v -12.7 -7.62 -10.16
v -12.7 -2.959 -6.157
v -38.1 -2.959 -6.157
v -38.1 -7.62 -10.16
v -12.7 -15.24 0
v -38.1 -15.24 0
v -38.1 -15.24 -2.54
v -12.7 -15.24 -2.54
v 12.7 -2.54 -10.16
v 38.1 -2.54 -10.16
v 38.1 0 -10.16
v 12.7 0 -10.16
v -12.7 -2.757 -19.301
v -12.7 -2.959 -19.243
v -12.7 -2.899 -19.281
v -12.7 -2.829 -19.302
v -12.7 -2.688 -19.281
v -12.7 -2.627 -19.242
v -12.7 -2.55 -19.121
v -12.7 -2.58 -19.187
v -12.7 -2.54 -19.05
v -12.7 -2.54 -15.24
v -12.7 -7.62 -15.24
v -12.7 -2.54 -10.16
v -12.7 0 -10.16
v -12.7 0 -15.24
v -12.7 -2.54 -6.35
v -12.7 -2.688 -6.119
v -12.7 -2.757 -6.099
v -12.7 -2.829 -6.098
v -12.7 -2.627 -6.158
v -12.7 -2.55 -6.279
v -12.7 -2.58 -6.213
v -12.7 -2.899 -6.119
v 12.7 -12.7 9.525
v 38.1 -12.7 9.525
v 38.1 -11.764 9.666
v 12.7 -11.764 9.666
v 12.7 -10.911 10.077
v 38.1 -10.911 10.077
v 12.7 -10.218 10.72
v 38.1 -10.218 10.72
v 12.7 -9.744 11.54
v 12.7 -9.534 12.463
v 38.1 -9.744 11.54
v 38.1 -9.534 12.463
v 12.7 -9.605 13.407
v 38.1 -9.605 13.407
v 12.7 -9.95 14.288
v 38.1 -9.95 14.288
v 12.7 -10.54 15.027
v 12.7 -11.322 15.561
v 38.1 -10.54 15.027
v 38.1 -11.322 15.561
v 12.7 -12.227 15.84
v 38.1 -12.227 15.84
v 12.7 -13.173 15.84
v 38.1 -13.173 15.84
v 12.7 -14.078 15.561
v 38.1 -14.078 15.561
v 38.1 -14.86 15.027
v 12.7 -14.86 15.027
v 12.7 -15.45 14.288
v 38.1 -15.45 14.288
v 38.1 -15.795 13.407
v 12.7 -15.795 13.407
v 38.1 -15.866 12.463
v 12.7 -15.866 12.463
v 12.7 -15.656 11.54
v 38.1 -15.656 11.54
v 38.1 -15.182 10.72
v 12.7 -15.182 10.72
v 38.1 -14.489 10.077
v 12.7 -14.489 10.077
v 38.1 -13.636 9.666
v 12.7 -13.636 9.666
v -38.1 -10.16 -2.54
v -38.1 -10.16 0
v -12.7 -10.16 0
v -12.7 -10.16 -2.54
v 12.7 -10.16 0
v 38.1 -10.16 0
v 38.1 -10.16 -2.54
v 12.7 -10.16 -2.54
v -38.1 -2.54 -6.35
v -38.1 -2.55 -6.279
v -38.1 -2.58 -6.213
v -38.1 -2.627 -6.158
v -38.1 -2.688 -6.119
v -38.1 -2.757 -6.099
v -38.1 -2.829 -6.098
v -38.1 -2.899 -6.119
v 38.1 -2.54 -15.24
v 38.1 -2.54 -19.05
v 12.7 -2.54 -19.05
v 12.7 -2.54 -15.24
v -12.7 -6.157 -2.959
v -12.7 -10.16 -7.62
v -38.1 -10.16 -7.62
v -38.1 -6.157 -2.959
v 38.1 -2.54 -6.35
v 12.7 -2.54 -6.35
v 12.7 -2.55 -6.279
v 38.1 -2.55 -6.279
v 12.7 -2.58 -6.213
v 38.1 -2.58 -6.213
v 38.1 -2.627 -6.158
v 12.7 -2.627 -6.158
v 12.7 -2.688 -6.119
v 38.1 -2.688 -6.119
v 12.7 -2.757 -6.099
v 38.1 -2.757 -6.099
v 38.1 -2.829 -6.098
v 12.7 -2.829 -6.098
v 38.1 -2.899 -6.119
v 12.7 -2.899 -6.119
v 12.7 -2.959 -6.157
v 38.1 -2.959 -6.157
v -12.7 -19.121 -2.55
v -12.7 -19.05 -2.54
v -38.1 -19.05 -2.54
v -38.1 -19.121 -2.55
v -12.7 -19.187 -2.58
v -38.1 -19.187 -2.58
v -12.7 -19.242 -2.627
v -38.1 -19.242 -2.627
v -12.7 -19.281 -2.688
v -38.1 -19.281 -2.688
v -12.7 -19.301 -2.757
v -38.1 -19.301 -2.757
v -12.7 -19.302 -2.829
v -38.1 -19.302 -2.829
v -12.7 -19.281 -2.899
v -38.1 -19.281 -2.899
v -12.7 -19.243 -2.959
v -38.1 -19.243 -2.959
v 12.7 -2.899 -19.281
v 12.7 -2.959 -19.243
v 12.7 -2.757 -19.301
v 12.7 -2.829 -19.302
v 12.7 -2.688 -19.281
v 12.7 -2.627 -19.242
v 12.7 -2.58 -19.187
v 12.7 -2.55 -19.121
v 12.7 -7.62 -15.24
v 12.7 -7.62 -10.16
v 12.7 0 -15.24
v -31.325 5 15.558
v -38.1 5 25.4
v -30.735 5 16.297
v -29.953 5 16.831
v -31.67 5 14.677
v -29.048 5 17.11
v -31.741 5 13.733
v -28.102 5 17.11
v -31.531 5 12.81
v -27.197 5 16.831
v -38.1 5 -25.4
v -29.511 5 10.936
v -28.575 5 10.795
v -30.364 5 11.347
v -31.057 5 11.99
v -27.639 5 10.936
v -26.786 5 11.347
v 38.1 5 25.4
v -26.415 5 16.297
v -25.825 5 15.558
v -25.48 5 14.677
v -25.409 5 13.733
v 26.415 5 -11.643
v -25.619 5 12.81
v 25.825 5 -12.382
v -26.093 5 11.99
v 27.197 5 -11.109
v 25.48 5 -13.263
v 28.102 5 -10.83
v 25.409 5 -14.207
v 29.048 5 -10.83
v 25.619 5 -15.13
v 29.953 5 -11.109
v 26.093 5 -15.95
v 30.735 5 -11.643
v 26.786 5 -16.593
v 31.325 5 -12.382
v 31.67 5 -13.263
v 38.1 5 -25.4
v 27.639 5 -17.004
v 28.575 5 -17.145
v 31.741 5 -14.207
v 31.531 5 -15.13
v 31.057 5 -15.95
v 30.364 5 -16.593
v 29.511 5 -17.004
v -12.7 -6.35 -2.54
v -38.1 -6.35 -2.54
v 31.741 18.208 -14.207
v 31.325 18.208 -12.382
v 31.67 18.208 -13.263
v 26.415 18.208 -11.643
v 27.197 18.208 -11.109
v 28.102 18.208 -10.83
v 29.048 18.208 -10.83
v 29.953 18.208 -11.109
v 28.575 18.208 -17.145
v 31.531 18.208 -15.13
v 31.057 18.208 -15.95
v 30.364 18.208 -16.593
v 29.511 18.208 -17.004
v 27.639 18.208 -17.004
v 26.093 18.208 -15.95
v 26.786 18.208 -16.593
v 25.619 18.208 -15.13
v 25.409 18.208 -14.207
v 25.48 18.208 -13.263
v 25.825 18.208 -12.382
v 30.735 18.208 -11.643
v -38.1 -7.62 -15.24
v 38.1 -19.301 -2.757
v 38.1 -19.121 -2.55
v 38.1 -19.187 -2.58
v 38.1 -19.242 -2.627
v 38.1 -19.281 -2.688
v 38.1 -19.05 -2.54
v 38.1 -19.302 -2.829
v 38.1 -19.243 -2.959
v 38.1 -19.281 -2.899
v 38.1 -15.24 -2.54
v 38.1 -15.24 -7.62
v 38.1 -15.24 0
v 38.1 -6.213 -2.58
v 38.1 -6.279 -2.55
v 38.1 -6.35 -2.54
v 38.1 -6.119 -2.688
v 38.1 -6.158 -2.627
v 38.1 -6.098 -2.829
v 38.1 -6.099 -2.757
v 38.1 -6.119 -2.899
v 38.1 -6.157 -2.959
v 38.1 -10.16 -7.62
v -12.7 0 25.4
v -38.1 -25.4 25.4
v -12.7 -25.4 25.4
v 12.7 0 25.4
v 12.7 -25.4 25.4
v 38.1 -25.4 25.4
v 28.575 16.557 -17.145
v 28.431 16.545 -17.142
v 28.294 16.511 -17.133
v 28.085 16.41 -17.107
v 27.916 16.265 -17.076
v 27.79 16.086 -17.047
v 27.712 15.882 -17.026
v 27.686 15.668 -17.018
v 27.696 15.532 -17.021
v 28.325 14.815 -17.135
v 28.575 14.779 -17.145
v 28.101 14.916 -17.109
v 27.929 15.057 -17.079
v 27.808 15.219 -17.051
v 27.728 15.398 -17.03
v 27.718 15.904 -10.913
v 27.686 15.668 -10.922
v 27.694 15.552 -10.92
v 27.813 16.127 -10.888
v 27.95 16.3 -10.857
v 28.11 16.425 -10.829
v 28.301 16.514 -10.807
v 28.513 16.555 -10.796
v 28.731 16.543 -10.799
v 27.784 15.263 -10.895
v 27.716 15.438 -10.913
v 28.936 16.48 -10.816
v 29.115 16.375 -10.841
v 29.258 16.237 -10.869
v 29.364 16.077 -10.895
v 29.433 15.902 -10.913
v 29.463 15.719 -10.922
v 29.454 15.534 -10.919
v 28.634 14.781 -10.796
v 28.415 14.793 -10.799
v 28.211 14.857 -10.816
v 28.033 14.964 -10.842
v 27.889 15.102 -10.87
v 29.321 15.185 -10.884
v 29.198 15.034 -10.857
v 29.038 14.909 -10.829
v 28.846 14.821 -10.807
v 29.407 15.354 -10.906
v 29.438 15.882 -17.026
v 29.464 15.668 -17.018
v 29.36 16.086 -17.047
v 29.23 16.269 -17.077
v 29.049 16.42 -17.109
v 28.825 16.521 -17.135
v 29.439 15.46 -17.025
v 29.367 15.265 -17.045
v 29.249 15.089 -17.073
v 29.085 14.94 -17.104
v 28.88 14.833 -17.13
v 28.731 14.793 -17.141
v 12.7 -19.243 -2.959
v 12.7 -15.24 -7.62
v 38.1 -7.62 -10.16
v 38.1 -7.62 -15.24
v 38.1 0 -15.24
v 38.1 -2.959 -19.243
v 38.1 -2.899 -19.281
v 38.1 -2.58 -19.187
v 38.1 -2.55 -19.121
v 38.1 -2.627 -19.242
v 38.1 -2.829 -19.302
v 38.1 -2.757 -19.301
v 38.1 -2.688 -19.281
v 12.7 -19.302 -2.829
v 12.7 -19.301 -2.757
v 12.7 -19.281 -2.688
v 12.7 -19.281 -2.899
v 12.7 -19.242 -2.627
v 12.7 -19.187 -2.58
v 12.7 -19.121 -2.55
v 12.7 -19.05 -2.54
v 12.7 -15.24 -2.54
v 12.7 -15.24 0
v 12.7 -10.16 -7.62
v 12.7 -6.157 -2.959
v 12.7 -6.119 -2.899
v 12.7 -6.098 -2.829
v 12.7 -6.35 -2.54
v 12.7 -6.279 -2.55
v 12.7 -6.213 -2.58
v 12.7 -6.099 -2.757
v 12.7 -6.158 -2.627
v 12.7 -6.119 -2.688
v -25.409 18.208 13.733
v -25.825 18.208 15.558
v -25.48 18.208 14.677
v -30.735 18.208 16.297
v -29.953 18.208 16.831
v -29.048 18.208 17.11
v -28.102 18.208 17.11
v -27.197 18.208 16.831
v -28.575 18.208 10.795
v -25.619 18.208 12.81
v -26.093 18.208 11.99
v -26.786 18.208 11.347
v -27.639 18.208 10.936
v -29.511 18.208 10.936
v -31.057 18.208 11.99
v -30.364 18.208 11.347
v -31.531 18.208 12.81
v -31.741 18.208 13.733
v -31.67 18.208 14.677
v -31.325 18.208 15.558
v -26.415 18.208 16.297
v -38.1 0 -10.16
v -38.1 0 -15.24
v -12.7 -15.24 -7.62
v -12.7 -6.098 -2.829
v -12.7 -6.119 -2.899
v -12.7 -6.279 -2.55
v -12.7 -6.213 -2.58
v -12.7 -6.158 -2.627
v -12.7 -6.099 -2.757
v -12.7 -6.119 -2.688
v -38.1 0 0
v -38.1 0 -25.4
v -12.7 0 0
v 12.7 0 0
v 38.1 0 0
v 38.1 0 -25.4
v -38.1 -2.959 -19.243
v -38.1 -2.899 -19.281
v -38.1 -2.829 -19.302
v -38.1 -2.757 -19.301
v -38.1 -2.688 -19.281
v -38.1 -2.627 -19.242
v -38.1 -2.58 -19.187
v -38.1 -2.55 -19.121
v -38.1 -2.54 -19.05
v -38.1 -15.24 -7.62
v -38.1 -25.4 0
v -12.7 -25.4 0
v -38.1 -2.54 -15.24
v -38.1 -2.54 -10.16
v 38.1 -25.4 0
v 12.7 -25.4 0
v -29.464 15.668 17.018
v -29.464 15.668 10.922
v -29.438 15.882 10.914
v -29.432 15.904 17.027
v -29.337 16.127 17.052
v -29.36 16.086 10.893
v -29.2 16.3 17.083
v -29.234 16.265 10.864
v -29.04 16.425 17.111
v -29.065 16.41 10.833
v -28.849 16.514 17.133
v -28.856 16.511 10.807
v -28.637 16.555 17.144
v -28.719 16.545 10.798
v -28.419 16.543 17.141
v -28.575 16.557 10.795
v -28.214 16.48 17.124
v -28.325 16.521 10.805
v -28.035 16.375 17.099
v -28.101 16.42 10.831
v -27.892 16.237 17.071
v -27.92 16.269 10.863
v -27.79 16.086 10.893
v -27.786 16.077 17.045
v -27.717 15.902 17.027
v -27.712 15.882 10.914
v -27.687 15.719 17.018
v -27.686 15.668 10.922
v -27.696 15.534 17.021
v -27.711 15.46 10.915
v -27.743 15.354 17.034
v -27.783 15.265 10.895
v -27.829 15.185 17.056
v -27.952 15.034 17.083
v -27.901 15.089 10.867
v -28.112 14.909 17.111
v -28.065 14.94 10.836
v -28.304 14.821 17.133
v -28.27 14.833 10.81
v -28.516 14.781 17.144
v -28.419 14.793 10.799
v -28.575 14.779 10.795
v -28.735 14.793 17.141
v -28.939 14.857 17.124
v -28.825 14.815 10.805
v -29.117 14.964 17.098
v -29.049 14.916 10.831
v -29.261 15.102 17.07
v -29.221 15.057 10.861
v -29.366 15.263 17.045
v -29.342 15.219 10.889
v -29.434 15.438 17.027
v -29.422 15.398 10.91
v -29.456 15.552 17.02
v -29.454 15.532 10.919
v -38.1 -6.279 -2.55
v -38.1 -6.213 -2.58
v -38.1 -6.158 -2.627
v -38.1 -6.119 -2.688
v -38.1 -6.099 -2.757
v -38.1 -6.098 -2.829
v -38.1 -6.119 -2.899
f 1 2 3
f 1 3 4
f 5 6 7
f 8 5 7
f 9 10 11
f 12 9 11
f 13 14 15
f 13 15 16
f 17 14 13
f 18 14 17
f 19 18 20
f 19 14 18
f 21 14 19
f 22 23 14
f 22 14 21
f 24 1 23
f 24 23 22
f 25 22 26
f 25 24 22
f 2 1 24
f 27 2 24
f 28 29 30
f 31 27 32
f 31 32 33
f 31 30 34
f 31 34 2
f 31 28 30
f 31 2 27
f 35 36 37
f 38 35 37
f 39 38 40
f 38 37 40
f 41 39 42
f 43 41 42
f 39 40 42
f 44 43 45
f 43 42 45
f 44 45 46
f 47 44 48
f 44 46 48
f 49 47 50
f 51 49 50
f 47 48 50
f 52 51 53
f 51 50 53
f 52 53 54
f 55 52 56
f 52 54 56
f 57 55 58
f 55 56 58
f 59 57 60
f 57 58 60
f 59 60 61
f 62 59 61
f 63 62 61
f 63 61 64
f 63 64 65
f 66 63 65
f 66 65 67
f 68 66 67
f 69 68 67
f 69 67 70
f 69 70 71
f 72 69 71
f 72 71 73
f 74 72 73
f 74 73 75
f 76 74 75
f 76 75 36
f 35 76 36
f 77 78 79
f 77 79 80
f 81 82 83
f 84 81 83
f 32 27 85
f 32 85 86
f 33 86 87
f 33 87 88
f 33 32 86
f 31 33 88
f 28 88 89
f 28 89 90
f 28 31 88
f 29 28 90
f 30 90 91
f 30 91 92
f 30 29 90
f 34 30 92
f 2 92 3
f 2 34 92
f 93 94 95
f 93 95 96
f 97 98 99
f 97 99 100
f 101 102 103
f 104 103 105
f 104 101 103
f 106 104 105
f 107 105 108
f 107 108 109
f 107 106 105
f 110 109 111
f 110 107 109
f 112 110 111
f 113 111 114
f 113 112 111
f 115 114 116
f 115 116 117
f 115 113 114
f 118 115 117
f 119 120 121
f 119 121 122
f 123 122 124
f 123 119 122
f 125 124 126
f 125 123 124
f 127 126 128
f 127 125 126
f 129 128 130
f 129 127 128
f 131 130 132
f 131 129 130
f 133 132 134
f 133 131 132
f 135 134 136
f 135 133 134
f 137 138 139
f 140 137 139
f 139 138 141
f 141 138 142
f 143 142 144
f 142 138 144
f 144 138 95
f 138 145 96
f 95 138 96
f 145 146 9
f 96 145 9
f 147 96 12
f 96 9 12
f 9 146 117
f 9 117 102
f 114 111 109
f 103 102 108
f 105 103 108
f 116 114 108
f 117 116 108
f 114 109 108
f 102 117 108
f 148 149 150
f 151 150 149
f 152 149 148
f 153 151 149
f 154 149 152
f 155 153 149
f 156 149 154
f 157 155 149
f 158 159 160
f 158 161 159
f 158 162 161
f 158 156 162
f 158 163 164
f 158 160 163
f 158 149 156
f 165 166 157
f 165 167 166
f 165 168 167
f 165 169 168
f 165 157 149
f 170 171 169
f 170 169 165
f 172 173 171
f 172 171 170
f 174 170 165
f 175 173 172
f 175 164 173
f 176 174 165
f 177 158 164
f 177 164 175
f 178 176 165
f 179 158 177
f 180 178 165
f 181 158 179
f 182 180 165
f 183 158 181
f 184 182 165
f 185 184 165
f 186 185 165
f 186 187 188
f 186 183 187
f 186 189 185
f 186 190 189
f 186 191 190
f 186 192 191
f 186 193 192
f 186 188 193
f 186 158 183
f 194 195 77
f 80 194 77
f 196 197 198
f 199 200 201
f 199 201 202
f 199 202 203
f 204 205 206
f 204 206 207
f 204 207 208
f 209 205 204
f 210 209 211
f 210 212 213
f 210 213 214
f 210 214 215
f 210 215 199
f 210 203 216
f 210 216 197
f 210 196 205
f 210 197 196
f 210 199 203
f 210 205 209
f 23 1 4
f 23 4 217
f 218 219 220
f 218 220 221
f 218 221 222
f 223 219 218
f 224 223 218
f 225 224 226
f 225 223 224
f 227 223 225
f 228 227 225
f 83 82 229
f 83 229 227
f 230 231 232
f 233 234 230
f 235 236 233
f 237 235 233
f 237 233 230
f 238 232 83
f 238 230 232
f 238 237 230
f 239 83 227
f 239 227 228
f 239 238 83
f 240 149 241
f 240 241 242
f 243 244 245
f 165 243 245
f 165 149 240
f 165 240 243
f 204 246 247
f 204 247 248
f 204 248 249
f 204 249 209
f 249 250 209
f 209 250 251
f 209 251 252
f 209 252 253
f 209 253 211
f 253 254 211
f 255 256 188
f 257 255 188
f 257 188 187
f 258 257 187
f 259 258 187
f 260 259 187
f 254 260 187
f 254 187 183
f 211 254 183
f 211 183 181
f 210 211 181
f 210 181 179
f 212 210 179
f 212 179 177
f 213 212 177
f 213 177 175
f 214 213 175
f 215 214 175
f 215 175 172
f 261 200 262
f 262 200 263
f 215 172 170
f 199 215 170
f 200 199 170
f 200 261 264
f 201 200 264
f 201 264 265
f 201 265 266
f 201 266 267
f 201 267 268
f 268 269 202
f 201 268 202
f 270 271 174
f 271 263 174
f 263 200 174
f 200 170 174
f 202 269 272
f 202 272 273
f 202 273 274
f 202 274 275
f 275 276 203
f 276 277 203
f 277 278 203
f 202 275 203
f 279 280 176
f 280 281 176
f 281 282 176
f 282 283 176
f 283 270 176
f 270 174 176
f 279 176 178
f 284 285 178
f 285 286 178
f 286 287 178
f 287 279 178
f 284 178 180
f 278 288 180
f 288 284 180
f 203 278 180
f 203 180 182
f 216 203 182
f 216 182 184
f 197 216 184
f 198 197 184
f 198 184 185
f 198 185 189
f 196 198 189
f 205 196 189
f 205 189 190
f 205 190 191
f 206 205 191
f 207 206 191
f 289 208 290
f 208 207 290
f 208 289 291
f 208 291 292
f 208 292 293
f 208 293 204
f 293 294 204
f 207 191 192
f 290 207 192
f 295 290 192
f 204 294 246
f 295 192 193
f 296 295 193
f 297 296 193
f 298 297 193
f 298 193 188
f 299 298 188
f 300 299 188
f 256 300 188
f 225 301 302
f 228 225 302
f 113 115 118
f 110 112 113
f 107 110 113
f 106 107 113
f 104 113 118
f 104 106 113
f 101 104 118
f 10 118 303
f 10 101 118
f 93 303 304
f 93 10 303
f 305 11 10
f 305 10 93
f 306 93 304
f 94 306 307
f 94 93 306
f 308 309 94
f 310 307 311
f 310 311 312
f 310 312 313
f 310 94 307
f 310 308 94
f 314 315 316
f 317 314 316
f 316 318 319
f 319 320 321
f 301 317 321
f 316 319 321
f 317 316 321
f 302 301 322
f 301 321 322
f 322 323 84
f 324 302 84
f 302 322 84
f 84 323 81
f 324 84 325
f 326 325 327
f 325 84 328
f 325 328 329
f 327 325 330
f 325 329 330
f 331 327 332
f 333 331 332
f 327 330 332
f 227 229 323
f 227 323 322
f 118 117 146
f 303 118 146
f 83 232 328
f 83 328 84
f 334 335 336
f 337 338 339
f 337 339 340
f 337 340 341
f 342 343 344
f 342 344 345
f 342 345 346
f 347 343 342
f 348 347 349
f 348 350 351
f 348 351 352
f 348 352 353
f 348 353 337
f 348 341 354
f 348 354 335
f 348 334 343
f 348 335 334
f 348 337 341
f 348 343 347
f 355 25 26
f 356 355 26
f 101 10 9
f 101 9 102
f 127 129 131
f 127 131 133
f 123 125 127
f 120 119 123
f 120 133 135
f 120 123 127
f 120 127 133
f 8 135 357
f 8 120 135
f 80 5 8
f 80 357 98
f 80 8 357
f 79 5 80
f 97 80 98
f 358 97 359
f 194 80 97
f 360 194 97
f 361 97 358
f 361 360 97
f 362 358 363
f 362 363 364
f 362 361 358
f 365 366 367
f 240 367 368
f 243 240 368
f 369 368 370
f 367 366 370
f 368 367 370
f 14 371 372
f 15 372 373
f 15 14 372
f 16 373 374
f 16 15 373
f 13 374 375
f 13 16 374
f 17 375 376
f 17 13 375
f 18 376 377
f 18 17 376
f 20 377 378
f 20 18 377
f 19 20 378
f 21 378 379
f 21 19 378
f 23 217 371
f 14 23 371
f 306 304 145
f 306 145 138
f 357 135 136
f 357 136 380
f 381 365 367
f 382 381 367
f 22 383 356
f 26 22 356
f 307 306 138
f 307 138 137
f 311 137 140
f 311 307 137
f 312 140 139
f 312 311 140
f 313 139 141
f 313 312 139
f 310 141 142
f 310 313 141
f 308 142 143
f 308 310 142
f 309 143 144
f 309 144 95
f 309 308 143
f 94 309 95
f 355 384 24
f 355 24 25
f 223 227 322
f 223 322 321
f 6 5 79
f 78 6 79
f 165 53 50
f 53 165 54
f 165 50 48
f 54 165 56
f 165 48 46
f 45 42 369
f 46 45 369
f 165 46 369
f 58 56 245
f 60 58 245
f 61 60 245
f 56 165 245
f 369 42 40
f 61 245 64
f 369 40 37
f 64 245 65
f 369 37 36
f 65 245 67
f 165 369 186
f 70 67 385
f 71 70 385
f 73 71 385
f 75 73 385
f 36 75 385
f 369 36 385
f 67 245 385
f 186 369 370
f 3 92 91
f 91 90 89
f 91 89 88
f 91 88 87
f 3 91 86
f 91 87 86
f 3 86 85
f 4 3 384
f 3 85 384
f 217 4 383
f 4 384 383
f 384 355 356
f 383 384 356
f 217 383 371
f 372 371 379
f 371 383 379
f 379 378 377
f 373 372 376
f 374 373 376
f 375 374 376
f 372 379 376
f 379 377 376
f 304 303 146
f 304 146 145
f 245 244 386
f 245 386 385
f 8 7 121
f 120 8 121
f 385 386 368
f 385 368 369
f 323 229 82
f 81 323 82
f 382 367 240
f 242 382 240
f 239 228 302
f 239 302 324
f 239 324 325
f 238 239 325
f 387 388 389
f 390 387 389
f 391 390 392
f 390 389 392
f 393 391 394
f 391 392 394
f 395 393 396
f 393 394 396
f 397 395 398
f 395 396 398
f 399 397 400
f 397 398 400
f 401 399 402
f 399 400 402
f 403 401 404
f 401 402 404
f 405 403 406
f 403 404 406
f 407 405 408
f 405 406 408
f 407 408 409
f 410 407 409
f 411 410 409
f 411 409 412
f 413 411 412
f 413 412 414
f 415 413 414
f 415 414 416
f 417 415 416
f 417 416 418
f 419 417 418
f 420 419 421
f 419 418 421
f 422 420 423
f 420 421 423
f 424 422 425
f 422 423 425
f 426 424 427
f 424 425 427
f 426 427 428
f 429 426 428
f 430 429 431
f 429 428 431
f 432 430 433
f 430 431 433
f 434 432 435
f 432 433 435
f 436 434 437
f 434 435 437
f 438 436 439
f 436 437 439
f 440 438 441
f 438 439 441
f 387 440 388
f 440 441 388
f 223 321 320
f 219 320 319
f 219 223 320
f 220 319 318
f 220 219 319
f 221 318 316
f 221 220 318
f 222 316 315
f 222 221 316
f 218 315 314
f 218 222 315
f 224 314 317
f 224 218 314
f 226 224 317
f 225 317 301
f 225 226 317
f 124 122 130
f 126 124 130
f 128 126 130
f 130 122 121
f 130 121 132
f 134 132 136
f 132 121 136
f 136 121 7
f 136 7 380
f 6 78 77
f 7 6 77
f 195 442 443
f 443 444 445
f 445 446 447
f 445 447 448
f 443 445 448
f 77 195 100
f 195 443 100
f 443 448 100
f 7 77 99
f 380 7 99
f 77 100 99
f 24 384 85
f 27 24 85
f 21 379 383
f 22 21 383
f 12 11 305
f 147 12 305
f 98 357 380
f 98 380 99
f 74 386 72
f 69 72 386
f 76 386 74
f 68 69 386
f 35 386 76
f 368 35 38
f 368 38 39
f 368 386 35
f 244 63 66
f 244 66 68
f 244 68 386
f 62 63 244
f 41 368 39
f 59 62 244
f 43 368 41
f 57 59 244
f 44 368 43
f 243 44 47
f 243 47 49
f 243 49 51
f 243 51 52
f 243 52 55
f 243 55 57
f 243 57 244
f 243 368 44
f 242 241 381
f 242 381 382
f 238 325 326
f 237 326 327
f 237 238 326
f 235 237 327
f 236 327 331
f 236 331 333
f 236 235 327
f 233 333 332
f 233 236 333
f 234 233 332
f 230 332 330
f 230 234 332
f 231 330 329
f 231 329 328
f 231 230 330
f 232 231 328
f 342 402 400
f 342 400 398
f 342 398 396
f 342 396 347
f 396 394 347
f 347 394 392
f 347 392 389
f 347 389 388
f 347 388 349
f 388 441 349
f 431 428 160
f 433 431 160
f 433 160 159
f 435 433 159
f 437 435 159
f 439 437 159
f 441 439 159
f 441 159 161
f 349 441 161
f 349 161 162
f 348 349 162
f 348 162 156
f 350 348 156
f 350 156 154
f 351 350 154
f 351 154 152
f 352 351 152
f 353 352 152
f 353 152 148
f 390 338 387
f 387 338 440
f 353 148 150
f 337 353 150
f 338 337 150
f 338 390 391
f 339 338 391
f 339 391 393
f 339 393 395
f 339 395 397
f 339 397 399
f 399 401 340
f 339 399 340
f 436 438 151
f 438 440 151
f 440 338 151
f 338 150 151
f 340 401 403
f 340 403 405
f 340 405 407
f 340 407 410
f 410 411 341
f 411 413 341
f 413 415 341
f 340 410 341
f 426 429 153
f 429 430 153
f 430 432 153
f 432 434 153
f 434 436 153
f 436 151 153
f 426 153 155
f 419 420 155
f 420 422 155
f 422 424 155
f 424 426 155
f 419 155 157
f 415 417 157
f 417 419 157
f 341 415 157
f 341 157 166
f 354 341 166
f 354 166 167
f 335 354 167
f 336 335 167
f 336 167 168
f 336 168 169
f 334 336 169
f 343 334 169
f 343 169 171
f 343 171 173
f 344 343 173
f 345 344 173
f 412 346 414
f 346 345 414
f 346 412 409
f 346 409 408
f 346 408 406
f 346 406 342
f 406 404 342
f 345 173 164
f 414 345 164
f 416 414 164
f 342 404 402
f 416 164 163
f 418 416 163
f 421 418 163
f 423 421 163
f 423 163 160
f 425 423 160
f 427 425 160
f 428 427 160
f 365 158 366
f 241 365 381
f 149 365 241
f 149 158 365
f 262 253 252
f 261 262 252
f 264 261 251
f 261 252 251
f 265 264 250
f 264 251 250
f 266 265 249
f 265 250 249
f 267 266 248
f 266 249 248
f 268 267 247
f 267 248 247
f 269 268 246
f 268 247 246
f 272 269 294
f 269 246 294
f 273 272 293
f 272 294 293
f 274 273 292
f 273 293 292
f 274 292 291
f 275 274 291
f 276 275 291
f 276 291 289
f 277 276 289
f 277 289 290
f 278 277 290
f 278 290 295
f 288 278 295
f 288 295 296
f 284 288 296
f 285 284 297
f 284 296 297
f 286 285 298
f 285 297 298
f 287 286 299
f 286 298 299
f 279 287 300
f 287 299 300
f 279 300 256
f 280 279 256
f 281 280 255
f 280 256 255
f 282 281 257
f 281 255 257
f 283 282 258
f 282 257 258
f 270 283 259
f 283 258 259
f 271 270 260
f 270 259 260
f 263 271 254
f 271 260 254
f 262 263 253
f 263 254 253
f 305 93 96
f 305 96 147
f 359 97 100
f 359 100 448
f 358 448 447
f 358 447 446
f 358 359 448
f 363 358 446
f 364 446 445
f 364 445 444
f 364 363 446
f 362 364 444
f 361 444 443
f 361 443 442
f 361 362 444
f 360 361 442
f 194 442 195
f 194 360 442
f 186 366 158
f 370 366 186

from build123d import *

# Parameters (mm, degrees)
SKETCH1_W                        = 76.2
SKETCH1_H                        = 50.8
BOSS_EXTRUDE1_DEPTH              = 5
SKETCH6_W                        = 25.4
SKETCH6_H                        = 25.4
BOSS_EXTRUDE2_DEPTH              = 25.4
F_1_4_0_25_DIAMETER_HOLE1_REACH  = 86.242
F_1_4_0_25_DIAMETER_HOLE1_BORE_R = 3.175
SKETCH10_W                       = 2.54
SKETCH10_H                       = 5.08
SKETCH10_W_2                     = 5.08
SKETCH10_H_2                     = 2.54
BOSS_EXTRUDE3_DEPTH              = 76.2
SKETCH11_W                       = 25.4
SKETCH11_H                       = 25.4
CUT_EXTRUDE2_DEPTH               = 50.8
SKETCH17_R                       = 3.175
BOSS_EXTRUDE4_DEPTH              = 13.208
SKETCH18_R                       = 0.889
CUT_EXTRUDE3_DEPTH               = 69.391593051


with BuildPart() as part:
    # Sketch1 → Boss-Extrude1 (new body)
    with BuildSketch(Plane(origin=(0, 0, 0), x_dir=(1, 0, 0), z_dir=(0, 1, 0))):
        Rectangle(SKETCH1_W, SKETCH1_H)
    extrude(amount=BOSS_EXTRUDE1_DEPTH)

    # Sketch6 → Boss-Extrude2 (add)
    with BuildSketch(Plane.XZ):
        with Locations((-25.4, 12.7)):
            Rectangle(SKETCH6_W, SKETCH6_H)
        with Locations((25.4, 12.7)):
            Rectangle(SKETCH6_W, SKETCH6_H)
    extrude(amount=BOSS_EXTRUDE2_DEPTH)

    # 1/4 (0.25) Diameter Hole1 bore → 1/4 (0.25) Diameter Hole1 (cut, up to next)
    with BuildSketch(Plane(origin=(38.1, 0, 0), x_dir=(0, 0, -1), z_dir=(1, 0, 0)), mode=Mode.PRIVATE) as f_1_4_0_25_diameter_hole1_sk1:
        with Locations((-12.7, -12.7)):
            Circle(F_1_4_0_25_DIAMETER_HOLE1_BORE_R)
    f_1_4_0_25_diameter_hole1_tool1 = extrude(f_1_4_0_25_diameter_hole1_sk1.sketch, amount=-F_1_4_0_25_DIAMETER_HOLE1_REACH, mode=Mode.PRIVATE) & part.part
    add(f_1_4_0_25_diameter_hole1_tool1.solids().sort_by_distance((38.1, -12.7, 12.7))[0], mode=Mode.SUBTRACT)

    # Sketch17 → Boss-Extrude4 (add)
    with BuildSketch(Plane(origin=(0, 5, 0), x_dir=(1, 0, 0), z_dir=(0, 1, 0))):
        with Locations(Location((-28.575, -13.97, 0), (0, 0, 90))):
            Circle(SKETCH17_R)
        with Locations(Location((28.575, 13.97, 0), (0, 0, 90))):
            Circle(SKETCH17_R)
    extrude(amount=BOSS_EXTRUDE4_DEPTH)

    # Sketch18 → Cut-Extrude3 (cut, through all)
    with BuildSketch(Plane(origin=(0, 0, -25.4), x_dir=(-1, 0, 0), z_dir=(0, 0, -1))):
        with Locations((-28.575, 15.668)):
            Circle(SKETCH18_R)
        with Locations((28.575, 15.668)):
            Circle(SKETCH18_R)
    extrude(amount=-CUT_EXTRUDE3_DEPTH, mode=Mode.SUBTRACT)


with BuildPart() as body_2:
    # Sketch10 → Boss-Extrude3 (new body)
    with BuildSketch(Plane(origin=(38.1, 0, 0), x_dir=(0, 0, -1), z_dir=(1, 0, 0))):
        with Locations((1.27, -12.7)):
            Rectangle(SKETCH10_W, SKETCH10_H)
        with BuildLine():
            Line((7.62, -10.16), (2.959490795, -6.157311659))
            ThreePointArc((2.959490795, -6.157311659), (2.687977979, -6.119185505), (2.54, -6.35))
            Line((2.54, -6.35), (2.54, -19.05))
            ThreePointArc((2.54, -19.05), (2.687977979, -19.280814495), (2.959490795, -19.242688341))
            Line((2.959490795, -19.242688341), (7.62, -15.24))
            Line((7.62, -15.24), (7.62, -10.16))
        make_face()
        with BuildLine():
            Line((19.05, -2.54), (6.35, -2.54))
            ThreePointArc((6.35, -2.54), (6.119185505, -2.687977979), (6.157311659, -2.959490795))
            Line((6.157311659, -2.959490795), (10.16, -7.62))
            Line((10.16, -7.62), (15.24, -7.62))
            Line((15.24, -7.62), (19.242688341, -2.959490795))
            ThreePointArc((19.242688341, -2.959490795), (19.280814495, -2.687977979), (19.05, -2.54))
        make_face()
        with Locations((12.7, -1.27)):
            Rectangle(SKETCH10_W_2, SKETCH10_H_2)
    extrude(amount=-BOSS_EXTRUDE3_DEPTH)

    # Sketch11 → Cut-Extrude2 (cut)
    with BuildSketch(Plane.XY.offset(25.4)):
        with Locations((0, -12.7)):
            Rectangle(SKETCH11_W, SKETCH11_H)
    extrude(amount=-CUT_EXTRUDE2_DEPTH, mode=Mode.SUBTRACT)


solid = Compound([part.part, body_2.part])
